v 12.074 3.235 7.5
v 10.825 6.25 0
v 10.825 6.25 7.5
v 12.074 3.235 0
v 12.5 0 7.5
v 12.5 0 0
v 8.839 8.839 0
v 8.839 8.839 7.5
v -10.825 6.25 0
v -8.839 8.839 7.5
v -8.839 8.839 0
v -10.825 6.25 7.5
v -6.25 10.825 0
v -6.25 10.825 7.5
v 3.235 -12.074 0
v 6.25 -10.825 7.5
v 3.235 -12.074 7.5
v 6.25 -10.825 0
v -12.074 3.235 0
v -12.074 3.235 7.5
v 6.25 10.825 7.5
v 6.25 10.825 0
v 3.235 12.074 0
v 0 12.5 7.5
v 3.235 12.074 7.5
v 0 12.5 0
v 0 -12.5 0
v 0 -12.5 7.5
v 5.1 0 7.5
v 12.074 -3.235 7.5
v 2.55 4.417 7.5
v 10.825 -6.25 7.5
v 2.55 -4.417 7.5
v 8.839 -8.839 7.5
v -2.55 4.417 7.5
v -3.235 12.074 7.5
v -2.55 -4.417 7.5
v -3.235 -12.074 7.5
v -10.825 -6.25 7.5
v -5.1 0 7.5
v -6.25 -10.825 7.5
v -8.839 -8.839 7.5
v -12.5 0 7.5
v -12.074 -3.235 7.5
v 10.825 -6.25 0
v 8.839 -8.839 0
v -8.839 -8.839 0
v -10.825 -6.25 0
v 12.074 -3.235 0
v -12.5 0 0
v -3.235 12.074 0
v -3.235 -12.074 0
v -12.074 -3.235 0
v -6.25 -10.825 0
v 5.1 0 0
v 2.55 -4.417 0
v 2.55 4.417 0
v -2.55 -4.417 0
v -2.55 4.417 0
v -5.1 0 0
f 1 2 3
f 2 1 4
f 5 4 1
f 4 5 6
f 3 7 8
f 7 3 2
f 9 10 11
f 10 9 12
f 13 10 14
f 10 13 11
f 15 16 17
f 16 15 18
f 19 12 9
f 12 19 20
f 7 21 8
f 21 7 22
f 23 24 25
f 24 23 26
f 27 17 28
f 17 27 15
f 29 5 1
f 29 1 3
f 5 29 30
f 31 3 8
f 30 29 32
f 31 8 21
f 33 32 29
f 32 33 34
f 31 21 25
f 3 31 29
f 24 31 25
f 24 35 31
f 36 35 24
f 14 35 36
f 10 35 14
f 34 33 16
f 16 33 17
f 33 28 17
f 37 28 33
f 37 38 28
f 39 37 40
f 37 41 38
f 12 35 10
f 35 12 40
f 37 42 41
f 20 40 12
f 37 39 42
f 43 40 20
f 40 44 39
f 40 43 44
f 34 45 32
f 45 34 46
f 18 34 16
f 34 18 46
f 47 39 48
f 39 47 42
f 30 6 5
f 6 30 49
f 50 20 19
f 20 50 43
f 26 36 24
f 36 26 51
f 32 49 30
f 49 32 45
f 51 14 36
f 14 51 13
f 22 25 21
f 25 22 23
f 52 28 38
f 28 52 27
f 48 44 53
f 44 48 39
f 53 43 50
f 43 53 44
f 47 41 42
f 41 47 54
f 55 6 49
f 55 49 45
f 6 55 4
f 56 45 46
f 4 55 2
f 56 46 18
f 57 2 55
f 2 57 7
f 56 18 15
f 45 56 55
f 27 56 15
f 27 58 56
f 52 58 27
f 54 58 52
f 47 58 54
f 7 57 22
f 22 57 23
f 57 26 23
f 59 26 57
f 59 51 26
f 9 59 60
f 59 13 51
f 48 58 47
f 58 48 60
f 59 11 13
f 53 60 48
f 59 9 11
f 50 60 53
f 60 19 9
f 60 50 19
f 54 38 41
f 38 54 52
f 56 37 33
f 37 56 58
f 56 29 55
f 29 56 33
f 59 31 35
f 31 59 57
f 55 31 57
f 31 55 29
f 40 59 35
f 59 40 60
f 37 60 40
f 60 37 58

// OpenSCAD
difference() {
  cylinder(d = 25, h = 7.5, $fn = 24);
  translate([0, 0, -0.1]) cylinder(d = 10 + 0.2, h = 7.5 + 0.2, $fn = 6);
}
